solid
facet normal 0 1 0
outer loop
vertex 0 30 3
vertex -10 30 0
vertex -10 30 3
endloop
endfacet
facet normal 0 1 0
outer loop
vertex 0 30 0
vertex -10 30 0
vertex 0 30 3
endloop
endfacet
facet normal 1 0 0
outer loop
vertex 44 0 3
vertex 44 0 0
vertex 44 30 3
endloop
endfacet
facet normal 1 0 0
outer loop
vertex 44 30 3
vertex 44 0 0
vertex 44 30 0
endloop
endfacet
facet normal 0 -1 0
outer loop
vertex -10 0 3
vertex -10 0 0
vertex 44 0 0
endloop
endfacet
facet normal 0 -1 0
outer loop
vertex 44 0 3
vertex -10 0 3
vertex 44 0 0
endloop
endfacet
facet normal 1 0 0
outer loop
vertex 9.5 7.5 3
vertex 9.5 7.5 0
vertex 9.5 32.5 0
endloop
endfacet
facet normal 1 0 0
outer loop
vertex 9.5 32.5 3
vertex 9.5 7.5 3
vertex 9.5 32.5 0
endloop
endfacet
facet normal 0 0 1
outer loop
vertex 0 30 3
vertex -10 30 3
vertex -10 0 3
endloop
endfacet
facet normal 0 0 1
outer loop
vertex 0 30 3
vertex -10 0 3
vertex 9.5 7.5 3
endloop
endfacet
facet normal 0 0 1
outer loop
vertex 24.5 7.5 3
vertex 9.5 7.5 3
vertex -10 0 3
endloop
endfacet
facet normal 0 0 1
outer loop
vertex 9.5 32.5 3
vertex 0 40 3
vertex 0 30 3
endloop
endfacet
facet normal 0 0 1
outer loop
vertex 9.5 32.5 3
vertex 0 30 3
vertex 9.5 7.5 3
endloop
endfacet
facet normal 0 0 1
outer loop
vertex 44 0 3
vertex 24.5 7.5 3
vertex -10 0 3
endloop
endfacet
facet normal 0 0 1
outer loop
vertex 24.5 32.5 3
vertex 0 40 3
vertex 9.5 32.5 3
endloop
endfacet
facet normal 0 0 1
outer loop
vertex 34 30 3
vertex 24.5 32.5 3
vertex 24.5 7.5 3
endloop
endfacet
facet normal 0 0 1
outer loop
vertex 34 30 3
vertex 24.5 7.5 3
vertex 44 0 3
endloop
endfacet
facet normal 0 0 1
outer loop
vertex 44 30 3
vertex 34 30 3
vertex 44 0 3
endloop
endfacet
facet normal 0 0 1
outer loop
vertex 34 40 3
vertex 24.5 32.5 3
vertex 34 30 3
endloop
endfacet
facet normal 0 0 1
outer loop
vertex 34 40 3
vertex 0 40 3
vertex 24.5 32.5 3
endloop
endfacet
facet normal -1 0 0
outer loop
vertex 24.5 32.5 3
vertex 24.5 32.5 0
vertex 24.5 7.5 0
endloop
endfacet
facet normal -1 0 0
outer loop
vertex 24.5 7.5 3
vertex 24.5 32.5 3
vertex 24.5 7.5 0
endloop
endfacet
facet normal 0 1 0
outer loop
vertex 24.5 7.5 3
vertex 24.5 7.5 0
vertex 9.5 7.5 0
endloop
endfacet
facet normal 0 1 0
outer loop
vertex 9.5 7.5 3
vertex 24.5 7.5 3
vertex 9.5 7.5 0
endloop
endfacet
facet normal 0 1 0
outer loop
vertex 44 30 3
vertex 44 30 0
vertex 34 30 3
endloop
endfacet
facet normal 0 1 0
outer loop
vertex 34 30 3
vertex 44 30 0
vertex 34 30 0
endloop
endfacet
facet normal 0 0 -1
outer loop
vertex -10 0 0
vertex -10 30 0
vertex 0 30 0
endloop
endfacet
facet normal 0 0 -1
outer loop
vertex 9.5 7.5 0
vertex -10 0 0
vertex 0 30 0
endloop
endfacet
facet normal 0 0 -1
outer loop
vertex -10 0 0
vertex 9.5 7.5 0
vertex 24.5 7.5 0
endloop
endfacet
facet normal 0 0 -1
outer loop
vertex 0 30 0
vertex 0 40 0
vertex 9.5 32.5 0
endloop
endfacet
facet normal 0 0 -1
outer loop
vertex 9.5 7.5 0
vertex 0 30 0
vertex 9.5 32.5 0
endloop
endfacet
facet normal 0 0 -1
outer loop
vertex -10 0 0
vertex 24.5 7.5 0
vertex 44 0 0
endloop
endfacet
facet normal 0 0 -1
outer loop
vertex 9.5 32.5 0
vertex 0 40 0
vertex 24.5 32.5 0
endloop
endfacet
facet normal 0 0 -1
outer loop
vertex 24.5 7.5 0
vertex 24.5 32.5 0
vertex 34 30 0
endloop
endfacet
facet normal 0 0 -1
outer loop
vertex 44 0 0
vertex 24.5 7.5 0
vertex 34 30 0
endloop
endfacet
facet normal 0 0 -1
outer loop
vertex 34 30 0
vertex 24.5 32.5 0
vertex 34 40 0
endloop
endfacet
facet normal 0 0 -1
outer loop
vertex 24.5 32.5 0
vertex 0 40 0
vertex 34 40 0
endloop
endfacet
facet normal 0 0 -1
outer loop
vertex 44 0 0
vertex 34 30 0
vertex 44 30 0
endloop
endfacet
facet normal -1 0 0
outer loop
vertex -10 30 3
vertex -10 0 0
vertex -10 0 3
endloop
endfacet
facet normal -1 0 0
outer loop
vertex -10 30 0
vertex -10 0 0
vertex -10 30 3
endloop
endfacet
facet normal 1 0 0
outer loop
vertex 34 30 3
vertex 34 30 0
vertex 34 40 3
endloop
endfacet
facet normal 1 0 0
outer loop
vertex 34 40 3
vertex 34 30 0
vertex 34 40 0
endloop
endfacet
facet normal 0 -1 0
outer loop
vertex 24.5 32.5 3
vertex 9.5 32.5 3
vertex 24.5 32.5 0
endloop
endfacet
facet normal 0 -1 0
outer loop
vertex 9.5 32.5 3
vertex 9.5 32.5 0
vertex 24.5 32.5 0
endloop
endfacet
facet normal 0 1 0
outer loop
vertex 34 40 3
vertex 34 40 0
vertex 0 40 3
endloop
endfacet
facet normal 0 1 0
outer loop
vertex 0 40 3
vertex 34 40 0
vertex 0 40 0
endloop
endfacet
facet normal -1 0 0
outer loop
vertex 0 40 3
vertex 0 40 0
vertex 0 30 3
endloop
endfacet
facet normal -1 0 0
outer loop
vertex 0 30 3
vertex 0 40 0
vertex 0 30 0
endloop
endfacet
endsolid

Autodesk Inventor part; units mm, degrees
ref_plane "YZ Plane" through (0, 0, 0) normal (1, 0, 0) x (0, 1, 0)
ref_plane "XZ Plane" through (0, 0, 0) normal (0, 1, 0) x (-1, 0, 0)
ref_plane "XY Plane" through (0, 0, 0) normal (0, 0, 1) x (1, 0, 0)
sketch "Sketch1" plane through (0, 0, 0) normal (0, 0, 1) x (1, 0, 0)
  line L0 (0, 0) -> (34, 0)
  line L1 (34, 0) -> (34, 40)
  line L2 (34, 40) -> (0, 40)
  line L3 (0, 40) -> (0, 0)
  line L4 (-10, 30) -> (0, 30)
  line L5 (0, 30) -> (0, 0)
  line L6 (0, 0) -> (-10, 0)
  line L7 (-10, 0) -> (-10, 30)
  line L8 (-10, 30) -> (0, 0) construction
  line L9 (0, 30) -> (-10, 0) construction
  line L10 (44, 30) -> (34, 30)
  line L11 (34, 30) -> (34, 0)
  line L12 (34, 0) -> (44, 0)
  line L13 (44, 0) -> (44, 30)
  line L14 (44, 30) -> (34, 0) construction
  line L15 (34, 30) -> (44, 0) construction
  line L16 (9.5, 32.5) -> (24.5, 32.5)
  line L17 (24.5, 32.5) -> (24.5, 7.5)
  line L18 (24.5, 7.5) -> (9.5, 7.5)
  line L19 (9.5, 7.5) -> (9.5, 32.5)
  line L20 (9.5, 32.5) -> (24.5, 7.5) construction
  line L21 (24.5, 32.5) -> (9.5, 7.5) construction
  point P0 (-5, 15)
  point P1 (39, 15)
  point P2 (0, 20)
  point P3 (0, 15)
  point P4 (34, 30)
  point P5 (0, 30)
  point P6 (17, 20)
  point P7 (17, 40)
  point P8 (34, 20)
  dimension "d0" = 34
  dimension "d1" = 40
  dimension "d2" = 10
  dimension "d3" = 10
  dimension "d4" = 30
  dimension "d5" = 30
  dimension "d8" = 15
  dimension "d9" = 25
extrude "Extrusion1" add sketch "Sketch1" along normal blind 3
properties part number "Frontrail"
